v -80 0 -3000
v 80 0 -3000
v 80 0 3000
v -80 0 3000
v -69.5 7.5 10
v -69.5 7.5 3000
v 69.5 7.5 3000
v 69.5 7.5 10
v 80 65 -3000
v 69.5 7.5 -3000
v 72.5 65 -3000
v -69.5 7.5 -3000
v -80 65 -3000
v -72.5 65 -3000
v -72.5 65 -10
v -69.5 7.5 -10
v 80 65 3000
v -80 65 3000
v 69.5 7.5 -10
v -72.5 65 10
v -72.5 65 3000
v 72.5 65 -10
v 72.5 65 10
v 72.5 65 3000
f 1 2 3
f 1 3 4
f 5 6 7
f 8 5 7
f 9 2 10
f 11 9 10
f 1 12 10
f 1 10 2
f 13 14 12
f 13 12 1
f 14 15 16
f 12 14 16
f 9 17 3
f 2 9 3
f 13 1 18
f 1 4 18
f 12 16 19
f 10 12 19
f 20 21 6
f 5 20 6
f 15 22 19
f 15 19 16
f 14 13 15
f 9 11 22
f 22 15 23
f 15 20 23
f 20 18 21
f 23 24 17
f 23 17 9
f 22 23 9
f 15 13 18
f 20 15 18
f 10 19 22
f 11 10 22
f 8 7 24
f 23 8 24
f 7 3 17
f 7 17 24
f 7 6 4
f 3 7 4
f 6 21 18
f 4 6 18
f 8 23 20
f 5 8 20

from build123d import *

# Parameters (mm, degrees)
AUFSATZ_LINEAR_AUSTRAGEN1_DEPTH = 3000
AUFSATZ_LINEAR_AUSTRAGEN2_DEPTH = 10


with BuildPart() as part:
    # Skizze1 → Aufsatz-Linear austragen1 (new body, symmetric)
    with BuildSketch(Plane.XY):
        Polygon((80, 0), (-80, 0), (-80, 65), (-72.5, 65), (-69.5, 7.5), (69.5, 7.5), (72.5, 65), (80, 65), align=None)
    extrude(amount=AUFSATZ_LINEAR_AUSTRAGEN1_DEPTH, both=True)

    # Skizze2 → Aufsatz-Linear austragen2 (add, symmetric)
    with BuildSketch(Plane.XY):
        Polygon((-69.5, 7.5), (-72.5, 65), (72.5, 65), (69.5, 7.5), align=None)
    extrude(amount=AUFSATZ_LINEAR_AUSTRAGEN2_DEPTH, both=True)


solid = part.part
